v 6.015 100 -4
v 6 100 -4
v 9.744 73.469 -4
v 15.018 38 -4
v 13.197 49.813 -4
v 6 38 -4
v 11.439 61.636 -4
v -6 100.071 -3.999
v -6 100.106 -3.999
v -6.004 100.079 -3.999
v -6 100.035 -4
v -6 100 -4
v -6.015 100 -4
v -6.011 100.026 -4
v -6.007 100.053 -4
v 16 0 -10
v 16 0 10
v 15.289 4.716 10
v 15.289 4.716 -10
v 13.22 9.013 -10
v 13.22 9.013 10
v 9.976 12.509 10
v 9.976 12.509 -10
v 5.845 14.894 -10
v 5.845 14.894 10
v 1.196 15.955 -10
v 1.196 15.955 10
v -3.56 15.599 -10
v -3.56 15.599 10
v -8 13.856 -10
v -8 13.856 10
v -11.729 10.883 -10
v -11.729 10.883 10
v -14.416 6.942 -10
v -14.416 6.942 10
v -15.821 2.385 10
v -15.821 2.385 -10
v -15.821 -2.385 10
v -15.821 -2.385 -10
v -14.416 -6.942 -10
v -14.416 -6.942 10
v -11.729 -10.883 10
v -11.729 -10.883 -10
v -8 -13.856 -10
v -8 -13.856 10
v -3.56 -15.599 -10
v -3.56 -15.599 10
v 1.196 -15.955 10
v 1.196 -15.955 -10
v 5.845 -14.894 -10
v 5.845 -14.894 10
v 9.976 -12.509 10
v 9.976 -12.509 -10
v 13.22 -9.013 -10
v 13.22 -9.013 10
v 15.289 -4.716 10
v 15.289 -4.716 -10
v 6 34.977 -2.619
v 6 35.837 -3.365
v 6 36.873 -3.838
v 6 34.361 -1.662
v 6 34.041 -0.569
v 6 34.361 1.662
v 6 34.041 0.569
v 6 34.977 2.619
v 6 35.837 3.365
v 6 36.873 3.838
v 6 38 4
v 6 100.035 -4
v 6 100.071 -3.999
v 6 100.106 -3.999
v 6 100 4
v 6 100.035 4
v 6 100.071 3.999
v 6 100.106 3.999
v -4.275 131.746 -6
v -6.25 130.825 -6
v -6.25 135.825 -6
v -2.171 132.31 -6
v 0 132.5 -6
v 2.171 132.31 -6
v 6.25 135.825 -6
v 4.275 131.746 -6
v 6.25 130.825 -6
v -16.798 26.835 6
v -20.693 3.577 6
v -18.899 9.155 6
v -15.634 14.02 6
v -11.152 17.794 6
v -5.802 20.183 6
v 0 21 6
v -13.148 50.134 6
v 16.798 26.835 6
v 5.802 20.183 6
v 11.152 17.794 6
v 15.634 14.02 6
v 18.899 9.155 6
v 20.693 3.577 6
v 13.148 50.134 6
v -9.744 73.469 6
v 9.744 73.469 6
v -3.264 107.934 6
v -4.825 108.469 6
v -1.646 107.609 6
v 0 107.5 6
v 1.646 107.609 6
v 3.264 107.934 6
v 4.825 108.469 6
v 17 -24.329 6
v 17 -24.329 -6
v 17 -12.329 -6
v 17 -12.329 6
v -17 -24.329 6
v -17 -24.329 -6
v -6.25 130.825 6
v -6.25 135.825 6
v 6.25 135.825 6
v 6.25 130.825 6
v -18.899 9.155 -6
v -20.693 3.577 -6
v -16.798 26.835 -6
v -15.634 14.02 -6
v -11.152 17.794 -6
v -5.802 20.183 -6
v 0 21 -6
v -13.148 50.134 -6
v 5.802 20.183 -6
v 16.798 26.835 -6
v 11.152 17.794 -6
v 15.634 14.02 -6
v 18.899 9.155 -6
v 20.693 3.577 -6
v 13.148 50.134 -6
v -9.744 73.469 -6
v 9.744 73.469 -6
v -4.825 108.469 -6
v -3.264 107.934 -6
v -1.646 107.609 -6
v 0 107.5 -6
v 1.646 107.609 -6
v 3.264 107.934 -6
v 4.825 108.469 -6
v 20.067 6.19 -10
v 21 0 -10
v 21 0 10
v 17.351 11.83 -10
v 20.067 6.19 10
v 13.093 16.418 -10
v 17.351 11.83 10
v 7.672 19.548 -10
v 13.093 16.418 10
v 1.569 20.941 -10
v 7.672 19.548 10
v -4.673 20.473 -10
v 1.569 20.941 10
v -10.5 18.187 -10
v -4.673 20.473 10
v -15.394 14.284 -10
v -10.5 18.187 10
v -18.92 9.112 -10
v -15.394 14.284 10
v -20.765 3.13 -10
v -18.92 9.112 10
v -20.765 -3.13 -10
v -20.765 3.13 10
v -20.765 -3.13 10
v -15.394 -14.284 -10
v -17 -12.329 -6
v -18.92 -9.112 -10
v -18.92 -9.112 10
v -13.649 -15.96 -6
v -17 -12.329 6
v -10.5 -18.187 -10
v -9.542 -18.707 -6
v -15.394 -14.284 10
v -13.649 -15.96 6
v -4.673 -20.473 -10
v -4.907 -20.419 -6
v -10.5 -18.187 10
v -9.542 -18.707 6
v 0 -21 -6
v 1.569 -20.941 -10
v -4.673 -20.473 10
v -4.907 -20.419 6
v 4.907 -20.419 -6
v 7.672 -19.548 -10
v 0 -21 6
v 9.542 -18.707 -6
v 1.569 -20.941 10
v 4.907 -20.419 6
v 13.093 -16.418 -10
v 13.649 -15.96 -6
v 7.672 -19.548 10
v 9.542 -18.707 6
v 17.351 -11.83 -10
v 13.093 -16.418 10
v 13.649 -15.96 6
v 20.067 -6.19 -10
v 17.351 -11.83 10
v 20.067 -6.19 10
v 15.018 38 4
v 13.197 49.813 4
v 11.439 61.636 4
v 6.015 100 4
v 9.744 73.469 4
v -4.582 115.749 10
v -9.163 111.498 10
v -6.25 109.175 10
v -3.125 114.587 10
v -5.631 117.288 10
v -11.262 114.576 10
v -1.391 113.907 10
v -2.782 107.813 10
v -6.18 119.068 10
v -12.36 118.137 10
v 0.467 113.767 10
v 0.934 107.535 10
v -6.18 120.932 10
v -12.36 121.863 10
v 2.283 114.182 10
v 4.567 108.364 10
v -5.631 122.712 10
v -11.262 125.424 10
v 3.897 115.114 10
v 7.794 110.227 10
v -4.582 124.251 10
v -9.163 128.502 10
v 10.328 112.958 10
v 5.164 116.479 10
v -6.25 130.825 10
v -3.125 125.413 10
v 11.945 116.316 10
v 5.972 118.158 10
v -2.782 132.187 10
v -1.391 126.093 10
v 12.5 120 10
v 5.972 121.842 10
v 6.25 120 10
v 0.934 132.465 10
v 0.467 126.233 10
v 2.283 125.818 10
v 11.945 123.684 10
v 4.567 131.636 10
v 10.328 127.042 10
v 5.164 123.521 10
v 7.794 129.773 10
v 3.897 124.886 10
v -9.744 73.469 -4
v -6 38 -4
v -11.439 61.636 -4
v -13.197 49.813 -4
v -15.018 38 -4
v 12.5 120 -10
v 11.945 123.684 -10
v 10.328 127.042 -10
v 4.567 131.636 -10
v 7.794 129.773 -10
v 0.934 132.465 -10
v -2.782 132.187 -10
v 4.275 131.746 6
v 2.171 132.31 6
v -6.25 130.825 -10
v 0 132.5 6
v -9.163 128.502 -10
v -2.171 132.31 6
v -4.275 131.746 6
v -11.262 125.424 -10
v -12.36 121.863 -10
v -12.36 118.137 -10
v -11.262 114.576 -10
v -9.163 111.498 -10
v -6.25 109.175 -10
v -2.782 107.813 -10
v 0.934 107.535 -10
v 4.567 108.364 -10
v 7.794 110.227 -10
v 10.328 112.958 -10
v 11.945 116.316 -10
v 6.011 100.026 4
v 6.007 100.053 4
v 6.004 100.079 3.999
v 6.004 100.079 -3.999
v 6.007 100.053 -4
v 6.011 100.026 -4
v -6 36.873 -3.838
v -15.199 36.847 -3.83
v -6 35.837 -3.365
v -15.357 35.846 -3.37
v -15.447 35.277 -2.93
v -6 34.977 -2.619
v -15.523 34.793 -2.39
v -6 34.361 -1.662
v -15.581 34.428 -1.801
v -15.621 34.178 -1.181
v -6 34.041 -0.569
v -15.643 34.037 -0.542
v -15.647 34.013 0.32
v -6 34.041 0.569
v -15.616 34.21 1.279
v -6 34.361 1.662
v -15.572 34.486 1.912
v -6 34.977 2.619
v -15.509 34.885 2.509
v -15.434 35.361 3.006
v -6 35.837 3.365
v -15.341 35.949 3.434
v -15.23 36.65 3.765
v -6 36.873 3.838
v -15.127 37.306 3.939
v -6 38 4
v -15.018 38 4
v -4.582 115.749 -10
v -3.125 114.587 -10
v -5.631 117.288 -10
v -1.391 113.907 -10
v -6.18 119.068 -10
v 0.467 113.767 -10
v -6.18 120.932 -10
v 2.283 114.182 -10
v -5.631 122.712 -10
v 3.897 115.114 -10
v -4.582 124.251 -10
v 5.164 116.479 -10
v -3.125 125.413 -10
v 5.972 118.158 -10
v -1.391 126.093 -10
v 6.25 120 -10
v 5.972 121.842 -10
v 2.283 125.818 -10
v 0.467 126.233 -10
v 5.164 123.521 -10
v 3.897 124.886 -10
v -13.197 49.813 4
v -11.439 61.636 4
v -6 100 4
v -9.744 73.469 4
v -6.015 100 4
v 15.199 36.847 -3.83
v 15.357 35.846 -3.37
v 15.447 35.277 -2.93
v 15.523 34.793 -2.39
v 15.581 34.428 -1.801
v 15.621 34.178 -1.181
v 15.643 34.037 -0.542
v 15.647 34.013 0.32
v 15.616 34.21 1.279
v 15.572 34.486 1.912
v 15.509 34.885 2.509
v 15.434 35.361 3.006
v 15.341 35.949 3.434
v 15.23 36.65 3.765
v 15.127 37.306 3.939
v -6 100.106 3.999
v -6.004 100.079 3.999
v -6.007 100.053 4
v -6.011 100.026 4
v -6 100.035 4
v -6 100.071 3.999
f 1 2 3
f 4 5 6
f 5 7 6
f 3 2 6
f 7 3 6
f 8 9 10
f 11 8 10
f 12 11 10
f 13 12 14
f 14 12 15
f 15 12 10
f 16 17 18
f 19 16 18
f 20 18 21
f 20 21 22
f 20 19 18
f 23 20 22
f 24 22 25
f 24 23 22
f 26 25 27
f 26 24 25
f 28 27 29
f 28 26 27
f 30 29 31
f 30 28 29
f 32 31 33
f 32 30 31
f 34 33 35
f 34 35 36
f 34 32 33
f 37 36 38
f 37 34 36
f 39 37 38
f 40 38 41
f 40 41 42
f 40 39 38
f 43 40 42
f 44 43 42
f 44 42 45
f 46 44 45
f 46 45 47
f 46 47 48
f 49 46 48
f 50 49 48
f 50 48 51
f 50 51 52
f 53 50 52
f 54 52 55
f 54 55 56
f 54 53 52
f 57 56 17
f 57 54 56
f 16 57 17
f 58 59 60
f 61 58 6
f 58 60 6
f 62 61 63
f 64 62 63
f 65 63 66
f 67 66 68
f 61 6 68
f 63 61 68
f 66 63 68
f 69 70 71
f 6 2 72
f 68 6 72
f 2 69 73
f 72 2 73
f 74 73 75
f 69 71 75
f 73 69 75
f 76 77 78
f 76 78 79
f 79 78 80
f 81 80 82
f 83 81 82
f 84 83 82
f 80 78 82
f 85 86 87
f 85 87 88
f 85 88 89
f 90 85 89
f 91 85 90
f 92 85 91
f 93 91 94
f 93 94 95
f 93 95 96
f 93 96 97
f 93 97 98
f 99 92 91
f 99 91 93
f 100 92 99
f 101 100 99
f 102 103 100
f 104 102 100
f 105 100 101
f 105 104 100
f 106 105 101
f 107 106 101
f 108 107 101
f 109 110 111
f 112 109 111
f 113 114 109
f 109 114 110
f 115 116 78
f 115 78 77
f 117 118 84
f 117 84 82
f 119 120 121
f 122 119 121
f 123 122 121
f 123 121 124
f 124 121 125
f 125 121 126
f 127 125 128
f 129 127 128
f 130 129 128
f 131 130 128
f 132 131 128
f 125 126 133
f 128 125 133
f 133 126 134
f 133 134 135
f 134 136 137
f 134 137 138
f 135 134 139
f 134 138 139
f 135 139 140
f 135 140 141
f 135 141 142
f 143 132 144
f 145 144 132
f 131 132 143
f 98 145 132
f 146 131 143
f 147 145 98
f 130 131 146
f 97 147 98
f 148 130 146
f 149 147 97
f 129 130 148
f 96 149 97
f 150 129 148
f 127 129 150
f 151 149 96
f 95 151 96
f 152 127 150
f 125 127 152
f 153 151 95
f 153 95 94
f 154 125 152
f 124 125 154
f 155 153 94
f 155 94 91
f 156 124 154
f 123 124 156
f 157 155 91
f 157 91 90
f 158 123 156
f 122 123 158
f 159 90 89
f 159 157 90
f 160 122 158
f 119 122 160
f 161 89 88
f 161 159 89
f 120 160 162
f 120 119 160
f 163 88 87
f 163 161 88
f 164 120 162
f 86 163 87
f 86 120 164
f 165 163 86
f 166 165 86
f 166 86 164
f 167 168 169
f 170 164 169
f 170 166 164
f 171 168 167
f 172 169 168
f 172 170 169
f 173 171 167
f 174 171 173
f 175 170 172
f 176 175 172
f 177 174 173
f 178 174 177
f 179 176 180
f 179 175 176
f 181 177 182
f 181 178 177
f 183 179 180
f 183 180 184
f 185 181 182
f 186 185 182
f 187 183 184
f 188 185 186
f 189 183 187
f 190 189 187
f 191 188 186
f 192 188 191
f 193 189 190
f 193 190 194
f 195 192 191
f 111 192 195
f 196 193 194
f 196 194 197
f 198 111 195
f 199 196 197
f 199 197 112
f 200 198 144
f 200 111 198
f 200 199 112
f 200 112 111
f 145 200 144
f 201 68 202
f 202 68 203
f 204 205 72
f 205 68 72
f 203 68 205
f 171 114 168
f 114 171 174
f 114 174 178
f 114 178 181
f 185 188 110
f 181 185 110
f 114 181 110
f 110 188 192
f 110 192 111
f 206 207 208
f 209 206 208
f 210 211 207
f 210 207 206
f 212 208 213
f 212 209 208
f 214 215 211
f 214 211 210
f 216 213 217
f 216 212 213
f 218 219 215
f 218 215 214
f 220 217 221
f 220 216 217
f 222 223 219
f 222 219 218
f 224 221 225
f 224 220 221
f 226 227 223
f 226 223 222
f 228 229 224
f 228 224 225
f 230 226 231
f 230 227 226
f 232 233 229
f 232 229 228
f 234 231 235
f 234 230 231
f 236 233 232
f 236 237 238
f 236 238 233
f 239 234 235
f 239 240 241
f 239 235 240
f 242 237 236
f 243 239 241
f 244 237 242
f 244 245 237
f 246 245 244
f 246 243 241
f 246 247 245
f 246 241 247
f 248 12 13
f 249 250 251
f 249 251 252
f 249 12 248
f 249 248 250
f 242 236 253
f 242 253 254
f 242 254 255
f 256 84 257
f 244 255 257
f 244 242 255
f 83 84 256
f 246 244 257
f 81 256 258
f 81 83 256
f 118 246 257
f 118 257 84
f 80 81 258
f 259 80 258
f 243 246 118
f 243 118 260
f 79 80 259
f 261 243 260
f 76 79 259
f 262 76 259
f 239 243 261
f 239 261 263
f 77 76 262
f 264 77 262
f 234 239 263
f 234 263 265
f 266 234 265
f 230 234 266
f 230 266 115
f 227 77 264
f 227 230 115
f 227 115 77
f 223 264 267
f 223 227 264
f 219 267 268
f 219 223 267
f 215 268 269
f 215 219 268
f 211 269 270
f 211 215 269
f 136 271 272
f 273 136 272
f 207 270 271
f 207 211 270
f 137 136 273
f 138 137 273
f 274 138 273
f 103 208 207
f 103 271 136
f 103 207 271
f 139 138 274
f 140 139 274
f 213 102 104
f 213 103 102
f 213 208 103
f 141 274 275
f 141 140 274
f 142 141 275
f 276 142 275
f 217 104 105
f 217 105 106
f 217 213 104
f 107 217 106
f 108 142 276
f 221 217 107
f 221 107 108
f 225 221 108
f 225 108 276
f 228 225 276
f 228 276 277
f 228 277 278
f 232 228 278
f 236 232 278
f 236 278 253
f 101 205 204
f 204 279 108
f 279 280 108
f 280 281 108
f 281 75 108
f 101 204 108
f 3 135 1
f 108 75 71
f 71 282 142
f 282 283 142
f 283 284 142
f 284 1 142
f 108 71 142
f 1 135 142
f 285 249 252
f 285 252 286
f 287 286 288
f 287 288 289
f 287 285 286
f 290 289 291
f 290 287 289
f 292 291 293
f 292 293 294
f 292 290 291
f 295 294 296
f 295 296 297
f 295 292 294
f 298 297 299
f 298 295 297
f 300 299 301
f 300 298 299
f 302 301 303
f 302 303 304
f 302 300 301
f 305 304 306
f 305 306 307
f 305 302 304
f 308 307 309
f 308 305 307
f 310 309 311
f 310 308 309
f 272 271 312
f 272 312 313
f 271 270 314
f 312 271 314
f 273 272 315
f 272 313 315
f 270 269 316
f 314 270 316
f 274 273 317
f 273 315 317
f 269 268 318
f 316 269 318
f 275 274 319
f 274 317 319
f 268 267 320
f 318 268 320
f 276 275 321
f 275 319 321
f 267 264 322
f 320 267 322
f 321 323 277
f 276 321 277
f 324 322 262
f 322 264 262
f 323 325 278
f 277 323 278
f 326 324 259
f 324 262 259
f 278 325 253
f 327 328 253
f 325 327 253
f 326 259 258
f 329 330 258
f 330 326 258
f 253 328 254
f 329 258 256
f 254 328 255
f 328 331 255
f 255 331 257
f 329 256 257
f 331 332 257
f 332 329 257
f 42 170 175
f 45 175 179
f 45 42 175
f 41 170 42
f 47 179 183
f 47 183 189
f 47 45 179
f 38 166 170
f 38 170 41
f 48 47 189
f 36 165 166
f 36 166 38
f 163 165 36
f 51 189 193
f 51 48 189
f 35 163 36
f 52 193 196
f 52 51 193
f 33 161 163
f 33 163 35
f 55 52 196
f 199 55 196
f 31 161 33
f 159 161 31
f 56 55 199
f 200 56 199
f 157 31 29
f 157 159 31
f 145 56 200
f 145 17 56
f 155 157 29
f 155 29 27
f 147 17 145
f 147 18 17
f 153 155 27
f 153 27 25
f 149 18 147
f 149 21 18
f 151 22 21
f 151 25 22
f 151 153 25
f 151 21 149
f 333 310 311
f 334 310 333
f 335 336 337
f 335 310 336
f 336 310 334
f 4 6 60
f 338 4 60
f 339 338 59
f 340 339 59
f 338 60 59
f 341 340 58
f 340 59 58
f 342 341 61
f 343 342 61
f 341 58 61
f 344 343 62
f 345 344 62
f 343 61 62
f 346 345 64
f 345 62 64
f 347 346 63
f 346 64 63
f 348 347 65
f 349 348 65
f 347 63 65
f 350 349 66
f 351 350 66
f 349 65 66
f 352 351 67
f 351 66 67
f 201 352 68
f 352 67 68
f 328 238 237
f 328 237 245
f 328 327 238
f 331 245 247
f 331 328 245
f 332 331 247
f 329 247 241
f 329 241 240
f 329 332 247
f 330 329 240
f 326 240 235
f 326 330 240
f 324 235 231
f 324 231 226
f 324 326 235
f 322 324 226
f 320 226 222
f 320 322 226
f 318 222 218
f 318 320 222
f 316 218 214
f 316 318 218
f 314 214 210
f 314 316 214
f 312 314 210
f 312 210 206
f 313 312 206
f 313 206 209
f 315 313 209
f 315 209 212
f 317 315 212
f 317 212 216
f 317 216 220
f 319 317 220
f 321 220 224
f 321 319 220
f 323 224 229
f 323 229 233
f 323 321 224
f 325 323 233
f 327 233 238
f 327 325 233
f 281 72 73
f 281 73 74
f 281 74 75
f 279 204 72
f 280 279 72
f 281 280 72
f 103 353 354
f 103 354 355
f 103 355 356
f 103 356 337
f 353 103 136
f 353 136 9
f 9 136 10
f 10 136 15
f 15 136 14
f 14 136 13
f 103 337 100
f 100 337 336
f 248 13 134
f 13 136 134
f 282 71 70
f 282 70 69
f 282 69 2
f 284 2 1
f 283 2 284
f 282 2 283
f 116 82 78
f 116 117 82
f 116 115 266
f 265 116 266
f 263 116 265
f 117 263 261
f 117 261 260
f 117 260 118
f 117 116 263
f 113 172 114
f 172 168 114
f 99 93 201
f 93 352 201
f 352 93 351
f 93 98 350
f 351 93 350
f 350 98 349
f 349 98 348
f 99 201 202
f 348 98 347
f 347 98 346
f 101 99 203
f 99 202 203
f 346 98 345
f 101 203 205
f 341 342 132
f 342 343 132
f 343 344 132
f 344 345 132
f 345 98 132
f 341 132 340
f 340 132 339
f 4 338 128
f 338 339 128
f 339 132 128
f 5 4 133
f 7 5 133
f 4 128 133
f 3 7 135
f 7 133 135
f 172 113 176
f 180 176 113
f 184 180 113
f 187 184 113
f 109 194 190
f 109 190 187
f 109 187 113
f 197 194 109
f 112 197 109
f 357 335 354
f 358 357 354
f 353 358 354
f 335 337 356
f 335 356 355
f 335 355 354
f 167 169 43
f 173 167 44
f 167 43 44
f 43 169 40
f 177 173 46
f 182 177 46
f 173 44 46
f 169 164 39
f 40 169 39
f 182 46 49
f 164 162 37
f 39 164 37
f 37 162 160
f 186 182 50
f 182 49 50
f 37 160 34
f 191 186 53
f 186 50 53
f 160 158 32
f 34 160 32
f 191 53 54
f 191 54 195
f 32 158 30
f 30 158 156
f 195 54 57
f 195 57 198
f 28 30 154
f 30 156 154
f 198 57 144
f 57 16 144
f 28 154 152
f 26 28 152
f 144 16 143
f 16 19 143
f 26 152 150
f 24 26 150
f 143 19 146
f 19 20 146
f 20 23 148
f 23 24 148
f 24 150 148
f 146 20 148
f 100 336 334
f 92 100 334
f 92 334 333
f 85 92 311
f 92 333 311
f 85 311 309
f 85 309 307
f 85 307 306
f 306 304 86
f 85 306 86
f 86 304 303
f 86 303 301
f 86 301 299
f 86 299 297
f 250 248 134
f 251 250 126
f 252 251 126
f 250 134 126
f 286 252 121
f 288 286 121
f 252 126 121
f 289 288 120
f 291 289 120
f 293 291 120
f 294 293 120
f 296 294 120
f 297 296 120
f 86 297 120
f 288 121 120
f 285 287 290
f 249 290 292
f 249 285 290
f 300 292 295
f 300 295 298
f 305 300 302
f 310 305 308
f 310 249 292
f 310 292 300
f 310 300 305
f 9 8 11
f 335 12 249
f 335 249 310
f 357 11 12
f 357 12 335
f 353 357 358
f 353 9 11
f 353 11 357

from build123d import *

# Parameters (mm, degrees)
SKETCH2_R             = 12.5
SKETCH2_R_2           = 6.25
BOSS_EXTRUDE3_DEPTH   = 10
SKETCH2_R_3           = 21
SKETCH2_R_4           = 16
BOSS_EXTRUDE3_2_DEPTH = 10
BOSS_EXTRUDE4_DEPTH   = 6
CUT_EXTRUDE2_START    = -6
CUT_EXTRUDE2_DEPTH    = 132.802456026
CUT_EXTRUDE3_START    = 6
CUT_EXTRUDE3_DEPTH    = 132.802456026


with BuildPart() as part:
    # Sketch2 → Boss-Extrude3 (new, symmetric)
    with BuildSketch(Plane.XY):
        with Locations((0, 120)):
            Circle(SKETCH2_R)
        with Locations((0, 120)):
            Circle(SKETCH2_R_2, mode=Mode.SUBTRACT)
    extrude(amount=BOSS_EXTRUDE3_DEPTH, both=True)



with BuildPart() as body_2:
    # Sketch2 → Boss-Extrude3 2 (new, symmetric)
    with BuildSketch(Plane.XY):
        Circle(SKETCH2_R_3)
        Circle(SKETCH2_R_4, mode=Mode.SUBTRACT)
    extrude(amount=BOSS_EXTRUDE3_2_DEPTH, both=True)


with BuildPart() as part_1:
    add(part.part)

    add(body_2.part)  # Boss-Extrude4 merges body 2
    # Sketch2<6> → Boss-Extrude4 (add, symmetric)
    with BuildSketch(Plane.XY):
        with BuildLine():
            Line((6.25, 135.825317547), (-6.25, 135.825317547))
            Line((-6.25, 135.825317547), (-6.25, 130.825317547))
            ThreePointArc((-6.25, 130.825317547), (0, 132.5), (6.25, 130.825317547))
            Line((6.25, 130.825317547), (6.25, 135.825317547))
        make_face()
        with BuildLine():
            Line((-4.824685415, 108.468633617), (-9.743614629, 73.468633617))
            ThreePointArc((-9.743614629, 73.468633617), (-14.942721631, 38.479711201), (-20.693090304, 3.577151615))
            ThreePointArc((-20.693090304, 3.577151615), (0, 21), (20.693090304, 3.577151615))
            ThreePointArc((20.693090304, 3.577151615), (14.942721631, 38.479711201), (9.743614629, 73.468633617))
            Line((9.743614629, 73.468633617), (4.824685415, 108.468633617))
            ThreePointArc((4.824685415, 108.468633617), (0, 107.5), (-4.824685415, 108.468633617))
        make_face()
        with BuildLine():
            Line((-17, -12.328828006), (-17, -24.328828006))
            Line((-17, -24.328828006), (17, -24.328828006))
            Line((17, -24.328828006), (17, -12.328828006))
            ThreePointArc((17, -12.328828006), (0, -21), (-17, -12.328828006))
        make_face()
    extrude(amount=BOSS_EXTRUDE4_DEPTH, both=True)

    # Sketch3 → Cut-Extrude2 (cut, through all)
    with BuildSketch(Plane(origin=(0, 0, 0), x_dir=(0, 0, -1), z_dir=(1, 0, 0)).offset(CUT_EXTRUDE2_START)):
        with BuildLine():
            Line((4, 100), (4, 38))
            ThreePointArc((4, 38), (0, 34), (-4, 38))
            Line((-4, 38), (-4, 100))
            ThreePointArc((-4, 100), (0, 104), (4, 100))
        make_face()
    extrude(amount=-CUT_EXTRUDE2_DEPTH, mode=Mode.SUBTRACT)

    # Sketch3<2> → Cut-Extrude3 (cut, through all)
    with BuildSketch(Plane(origin=(0, 0, 0), x_dir=(0, 0, -1), z_dir=(1, 0, 0)).offset(CUT_EXTRUDE3_START)):
        with BuildLine():
            Line((4, 100), (4, 38))
            ThreePointArc((4, 38), (0, 34), (-4, 38))
            Line((-4, 38), (-4, 100))
            ThreePointArc((-4, 100), (0, 104), (4, 100))
        make_face()
    extrude(amount=CUT_EXTRUDE3_DEPTH, mode=Mode.SUBTRACT)


solid = part_1.part
